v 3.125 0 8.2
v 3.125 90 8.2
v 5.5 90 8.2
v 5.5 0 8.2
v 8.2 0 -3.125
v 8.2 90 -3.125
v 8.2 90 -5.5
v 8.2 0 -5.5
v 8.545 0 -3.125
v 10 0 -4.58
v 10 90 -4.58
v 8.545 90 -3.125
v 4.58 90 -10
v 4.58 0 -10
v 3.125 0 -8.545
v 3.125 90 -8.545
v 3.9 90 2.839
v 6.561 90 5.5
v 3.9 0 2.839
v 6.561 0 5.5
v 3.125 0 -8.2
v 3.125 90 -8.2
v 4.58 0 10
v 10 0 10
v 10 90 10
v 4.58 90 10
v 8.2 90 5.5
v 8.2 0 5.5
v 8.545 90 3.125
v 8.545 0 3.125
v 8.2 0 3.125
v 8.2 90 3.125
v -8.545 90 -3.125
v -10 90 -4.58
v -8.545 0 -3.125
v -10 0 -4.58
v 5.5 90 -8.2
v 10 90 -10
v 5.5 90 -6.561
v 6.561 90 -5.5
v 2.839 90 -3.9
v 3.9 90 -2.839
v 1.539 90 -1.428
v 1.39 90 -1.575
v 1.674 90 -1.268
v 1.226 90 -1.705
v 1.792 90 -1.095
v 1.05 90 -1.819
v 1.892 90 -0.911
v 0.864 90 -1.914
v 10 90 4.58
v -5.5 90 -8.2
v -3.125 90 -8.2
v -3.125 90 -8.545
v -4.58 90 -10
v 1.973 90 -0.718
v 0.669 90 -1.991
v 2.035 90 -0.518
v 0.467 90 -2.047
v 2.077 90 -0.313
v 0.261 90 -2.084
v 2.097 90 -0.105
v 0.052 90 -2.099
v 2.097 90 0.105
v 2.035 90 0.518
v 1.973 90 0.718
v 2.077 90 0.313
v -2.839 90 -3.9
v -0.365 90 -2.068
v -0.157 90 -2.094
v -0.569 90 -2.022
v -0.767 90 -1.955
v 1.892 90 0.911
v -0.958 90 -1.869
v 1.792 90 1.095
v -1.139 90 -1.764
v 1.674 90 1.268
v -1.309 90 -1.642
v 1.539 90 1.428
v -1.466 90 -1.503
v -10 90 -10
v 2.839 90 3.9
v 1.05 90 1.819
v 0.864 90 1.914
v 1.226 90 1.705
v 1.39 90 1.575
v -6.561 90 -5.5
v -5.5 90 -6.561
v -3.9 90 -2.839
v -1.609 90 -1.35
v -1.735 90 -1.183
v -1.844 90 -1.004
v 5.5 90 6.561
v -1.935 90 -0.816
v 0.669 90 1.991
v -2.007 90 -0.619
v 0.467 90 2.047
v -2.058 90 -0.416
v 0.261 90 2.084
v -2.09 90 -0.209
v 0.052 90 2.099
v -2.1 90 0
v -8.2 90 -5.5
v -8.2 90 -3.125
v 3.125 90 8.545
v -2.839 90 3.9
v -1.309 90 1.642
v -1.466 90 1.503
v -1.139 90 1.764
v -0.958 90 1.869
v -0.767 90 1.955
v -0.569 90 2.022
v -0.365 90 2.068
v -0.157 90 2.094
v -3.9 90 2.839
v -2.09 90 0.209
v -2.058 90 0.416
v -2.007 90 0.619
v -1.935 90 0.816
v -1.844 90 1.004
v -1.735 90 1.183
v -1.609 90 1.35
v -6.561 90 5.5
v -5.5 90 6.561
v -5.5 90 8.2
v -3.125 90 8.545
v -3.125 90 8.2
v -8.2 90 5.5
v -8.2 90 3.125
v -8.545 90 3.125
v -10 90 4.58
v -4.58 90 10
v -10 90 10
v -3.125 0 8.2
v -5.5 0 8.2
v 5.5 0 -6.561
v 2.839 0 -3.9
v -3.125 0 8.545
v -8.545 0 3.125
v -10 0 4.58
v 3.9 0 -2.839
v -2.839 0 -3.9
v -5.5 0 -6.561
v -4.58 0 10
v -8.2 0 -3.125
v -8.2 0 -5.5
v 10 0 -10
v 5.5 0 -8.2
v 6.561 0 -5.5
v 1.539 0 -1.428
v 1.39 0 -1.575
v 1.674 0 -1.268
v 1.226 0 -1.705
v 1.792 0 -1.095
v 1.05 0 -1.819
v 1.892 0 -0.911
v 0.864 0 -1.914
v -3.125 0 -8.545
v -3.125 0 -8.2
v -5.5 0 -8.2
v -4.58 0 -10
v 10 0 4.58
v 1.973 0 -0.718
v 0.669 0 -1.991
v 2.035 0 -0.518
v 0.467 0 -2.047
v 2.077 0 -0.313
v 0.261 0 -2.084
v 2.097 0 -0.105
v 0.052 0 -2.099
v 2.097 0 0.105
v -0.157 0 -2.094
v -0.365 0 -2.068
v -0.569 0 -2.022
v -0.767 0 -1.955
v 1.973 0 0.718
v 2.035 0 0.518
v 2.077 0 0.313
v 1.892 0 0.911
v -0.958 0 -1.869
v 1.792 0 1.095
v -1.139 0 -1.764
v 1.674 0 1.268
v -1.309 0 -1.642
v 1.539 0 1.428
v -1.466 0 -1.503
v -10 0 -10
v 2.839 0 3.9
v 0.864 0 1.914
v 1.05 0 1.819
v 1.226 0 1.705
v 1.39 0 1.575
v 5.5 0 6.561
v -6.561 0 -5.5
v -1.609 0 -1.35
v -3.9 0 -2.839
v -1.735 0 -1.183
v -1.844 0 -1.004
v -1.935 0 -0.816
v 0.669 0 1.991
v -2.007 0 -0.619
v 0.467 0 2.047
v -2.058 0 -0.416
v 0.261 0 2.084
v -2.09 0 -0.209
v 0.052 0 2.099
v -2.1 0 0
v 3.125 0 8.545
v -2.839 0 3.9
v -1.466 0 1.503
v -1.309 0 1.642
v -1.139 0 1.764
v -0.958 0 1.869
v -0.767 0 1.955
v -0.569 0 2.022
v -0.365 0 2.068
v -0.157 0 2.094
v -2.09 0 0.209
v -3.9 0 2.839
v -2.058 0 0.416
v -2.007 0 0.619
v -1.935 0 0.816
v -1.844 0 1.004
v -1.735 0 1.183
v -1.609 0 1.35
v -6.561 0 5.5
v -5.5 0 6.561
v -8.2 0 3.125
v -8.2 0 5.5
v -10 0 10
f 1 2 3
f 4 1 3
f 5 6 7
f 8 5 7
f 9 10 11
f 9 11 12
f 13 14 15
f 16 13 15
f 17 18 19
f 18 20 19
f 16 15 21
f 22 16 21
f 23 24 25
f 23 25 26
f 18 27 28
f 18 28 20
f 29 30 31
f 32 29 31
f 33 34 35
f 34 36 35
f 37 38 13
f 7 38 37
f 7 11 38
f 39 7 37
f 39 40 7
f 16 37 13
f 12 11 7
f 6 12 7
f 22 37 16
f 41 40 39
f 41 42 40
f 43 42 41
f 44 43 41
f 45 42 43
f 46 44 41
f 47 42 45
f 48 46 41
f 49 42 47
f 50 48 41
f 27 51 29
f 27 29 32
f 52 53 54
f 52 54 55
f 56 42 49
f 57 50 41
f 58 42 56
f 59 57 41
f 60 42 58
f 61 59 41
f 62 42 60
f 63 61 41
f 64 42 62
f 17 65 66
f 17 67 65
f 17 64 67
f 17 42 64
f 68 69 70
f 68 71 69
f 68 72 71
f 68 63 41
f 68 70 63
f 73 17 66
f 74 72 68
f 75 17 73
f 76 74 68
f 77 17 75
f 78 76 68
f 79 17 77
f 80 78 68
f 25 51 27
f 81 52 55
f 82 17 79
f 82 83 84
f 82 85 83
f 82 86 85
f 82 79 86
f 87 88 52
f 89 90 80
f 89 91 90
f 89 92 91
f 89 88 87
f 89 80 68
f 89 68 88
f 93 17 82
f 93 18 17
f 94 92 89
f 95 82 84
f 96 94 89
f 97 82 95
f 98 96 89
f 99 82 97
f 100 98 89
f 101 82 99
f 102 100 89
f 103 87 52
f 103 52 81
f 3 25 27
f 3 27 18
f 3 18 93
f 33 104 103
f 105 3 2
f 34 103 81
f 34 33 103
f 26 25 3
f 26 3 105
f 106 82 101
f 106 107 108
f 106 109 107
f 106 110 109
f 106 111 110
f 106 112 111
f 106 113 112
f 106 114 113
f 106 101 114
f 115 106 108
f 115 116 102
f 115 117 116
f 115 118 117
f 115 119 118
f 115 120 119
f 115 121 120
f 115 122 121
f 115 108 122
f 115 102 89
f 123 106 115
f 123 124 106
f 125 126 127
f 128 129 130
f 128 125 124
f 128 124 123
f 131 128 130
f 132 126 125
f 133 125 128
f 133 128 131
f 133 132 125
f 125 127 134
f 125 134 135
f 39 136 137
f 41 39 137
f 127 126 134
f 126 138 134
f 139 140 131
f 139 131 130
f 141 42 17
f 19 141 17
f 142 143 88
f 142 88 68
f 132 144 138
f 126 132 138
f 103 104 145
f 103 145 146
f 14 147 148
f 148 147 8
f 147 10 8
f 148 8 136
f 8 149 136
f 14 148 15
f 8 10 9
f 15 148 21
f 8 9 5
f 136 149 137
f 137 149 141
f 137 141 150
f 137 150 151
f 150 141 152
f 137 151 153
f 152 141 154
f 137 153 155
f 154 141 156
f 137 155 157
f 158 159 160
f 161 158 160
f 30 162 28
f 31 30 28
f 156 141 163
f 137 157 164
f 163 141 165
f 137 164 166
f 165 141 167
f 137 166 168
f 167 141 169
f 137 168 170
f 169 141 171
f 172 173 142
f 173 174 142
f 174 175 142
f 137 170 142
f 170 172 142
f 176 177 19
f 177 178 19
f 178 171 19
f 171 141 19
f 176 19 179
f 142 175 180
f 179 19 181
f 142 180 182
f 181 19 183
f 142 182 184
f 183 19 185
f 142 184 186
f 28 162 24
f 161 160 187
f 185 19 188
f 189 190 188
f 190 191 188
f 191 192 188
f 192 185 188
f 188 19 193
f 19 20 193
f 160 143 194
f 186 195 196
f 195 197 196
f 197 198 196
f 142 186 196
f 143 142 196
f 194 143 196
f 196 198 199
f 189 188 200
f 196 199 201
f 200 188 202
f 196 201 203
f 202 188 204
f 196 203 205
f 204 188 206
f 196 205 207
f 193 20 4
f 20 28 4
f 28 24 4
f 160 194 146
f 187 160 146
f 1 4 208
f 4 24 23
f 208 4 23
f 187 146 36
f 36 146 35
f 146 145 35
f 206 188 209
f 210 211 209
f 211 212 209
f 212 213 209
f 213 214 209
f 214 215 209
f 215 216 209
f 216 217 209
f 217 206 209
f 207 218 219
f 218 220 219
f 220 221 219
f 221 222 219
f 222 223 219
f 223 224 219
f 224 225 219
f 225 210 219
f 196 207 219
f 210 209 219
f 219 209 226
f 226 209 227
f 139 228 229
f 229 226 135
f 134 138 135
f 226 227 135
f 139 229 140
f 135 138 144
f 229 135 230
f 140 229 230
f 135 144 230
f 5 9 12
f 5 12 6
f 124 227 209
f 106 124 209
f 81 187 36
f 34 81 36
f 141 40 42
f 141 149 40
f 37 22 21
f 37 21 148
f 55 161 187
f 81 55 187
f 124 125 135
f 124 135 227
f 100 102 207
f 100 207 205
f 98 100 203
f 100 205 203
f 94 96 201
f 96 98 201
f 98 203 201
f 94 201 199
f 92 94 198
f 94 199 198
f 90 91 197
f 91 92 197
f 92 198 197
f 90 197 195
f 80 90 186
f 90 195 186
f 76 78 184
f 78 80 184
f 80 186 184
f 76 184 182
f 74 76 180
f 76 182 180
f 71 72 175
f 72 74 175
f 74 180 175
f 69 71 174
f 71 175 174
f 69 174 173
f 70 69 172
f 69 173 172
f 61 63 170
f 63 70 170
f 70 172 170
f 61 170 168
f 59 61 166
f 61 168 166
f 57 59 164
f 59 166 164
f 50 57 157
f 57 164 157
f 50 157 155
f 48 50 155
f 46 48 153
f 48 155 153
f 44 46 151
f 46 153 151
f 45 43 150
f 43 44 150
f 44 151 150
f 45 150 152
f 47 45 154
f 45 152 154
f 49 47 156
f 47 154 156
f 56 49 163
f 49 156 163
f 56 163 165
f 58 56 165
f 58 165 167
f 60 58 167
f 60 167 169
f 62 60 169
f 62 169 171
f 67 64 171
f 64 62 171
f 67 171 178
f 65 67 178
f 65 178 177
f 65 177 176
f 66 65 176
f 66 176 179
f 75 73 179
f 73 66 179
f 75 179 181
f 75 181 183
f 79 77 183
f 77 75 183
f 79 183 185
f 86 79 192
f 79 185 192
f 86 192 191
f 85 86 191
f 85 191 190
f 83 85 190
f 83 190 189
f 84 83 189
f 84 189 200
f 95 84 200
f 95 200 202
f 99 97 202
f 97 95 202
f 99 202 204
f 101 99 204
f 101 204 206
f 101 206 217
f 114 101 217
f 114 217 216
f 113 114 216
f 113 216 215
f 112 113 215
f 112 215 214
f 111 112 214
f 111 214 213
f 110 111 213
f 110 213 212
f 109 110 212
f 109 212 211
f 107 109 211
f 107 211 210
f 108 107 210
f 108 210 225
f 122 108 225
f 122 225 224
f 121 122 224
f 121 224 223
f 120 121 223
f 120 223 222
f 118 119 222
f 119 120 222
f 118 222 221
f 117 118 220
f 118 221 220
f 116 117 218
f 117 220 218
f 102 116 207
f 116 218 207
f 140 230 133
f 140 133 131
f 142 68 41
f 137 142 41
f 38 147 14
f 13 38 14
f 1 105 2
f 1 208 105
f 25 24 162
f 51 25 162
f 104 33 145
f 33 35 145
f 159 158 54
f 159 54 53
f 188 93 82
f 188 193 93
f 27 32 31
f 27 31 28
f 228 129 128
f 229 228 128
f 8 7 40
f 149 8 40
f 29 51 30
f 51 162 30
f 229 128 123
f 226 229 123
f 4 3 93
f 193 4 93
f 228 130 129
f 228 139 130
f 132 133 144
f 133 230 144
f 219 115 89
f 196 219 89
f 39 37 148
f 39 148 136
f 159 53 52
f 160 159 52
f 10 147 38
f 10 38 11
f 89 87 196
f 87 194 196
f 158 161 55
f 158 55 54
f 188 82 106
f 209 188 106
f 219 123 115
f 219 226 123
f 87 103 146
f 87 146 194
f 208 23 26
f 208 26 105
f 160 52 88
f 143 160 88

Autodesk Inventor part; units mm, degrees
sketch "Sketch1" plane through (0, 0, 0) normal (0, 1, 0) x (-1, 0, 0)
  circle A0 centre (0, 0) radius 2.1
  line L0 (10, 10) -> (-10, 10) construction
  line L1 (-10, 10) -> (-10, -10) construction
  line L2 (-10, -10) -> (10, -10)
  line L3 (10, -10) -> (10, 10) construction
  line L4 (10, 10) -> (-10, -10) construction
  line L5 (-10, 10) -> (10, -10) construction
  line L6 (8.2, 10) -> (8.2, -10) construction
  line L7 (3.9, 10) -> (3.9, -10) construction
  line L8 (8.2, 3.125) -> (8.2, -3.125) construction
  line L9 (10, 4.58) -> (10, -4.58) construction
  line L10 (8.2, 5.5) -> (8.2, -5.5) construction
  line L11 (3.3697, 4.4303) -> (4.4303, 3.3697) construction
  line L12 (10, 10) -> (10, 4.58)
  line L13 (10, 4.58) -> (8.545, 3.125)
  line L14 (8.545, 3.125) -> (8.2, 3.125)
  line L15 (8.2, 3.125) -> (8.2, 5.5)
  line L16 (14, 0) -> (-14, 0) construction
  line L17 (8.2, 5.5) -> (6.5607, 5.5)
  line L18 (6.5607, 5.5) -> (3.9, 2.8393)
  line L19 (3.9, 2.8393) -> (3.9, 0)
  line L20 (10, -10) -> (10, -4.58)
  line L21 (10, -4.58) -> (8.545, -3.125)
  line L22 (8.545, -3.125) -> (8.2, -3.125)
  line L23 (8.2, -3.125) -> (8.2, -5.5)
  line L24 (8.2, -5.5) -> (6.5607, -5.5)
  line L25 (6.5607, -5.5) -> (3.9, -2.8393)
  line L26 (3.9, -2.8393) -> (3.9, 0)
  line L27 (-10, 10) -> (-4.58, 10)
  line L28 (-4.58, 10) -> (-3.125, 8.545)
  line L29 (-3.125, 8.2) -> (-5.5, 8.2)
  line L30 (-5.5, 8.2) -> (-5.5, 6.5607)
  line L31 (-5.5, 6.5607) -> (-2.8393, 3.9)
  line L32 (-2.8393, 3.9) -> (0, 3.9)
  line L33 (2.8393, 3.9) -> (0, 3.9)
  line L34 (5.5, 6.5607) -> (2.8393, 3.9)
  line L35 (5.5, 8.2) -> (5.5, 6.5607)
  line L36 (3.125, 8.2) -> (5.5, 8.2)
  line L37 (3.125, 8.545) -> (3.125, 8.2)
  line L38 (4.58, 10) -> (3.125, 8.545)
  line L39 (-3.125, 8.545) -> (-3.125, 8.2)
  line L40 (10, 10) -> (4.58, 10)
  line L41 (-10, -10) -> (-10, -4.58)
  line L42 (-10, -4.58) -> (-8.545, -3.125)
  line L43 (-8.2, -3.125) -> (-8.2, -5.5)
  line L44 (-8.2, -5.5) -> (-6.5607, -5.5)
  line L45 (-6.5607, -5.5) -> (-3.9, -2.8393)
  line L46 (-3.9, -2.8393) -> (-3.9, 0)
  line L47 (-3.9, 2.8393) -> (-3.9, 0)
  line L48 (-6.5607, 5.5) -> (-3.9, 2.8393)
  line L49 (-8.2, 5.5) -> (-6.5607, 5.5)
  line L50 (-8.2, 3.125) -> (-8.2, 5.5)
  line L51 (-8.545, 3.125) -> (-8.2, 3.125)
  line L52 (-10, 4.58) -> (-8.545, 3.125)
  line L53 (-8.545, -3.125) -> (-8.2, -3.125)
  line L54 (-10, 10) -> (-10, 4.58)
  line L55 (10, -10) -> (4.58, -10) construction
  line L56 (4.58, -10) -> (3.125, -8.545)
  line L57 (3.125, -8.2) -> (5.5, -8.2)
  line L58 (5.5, -8.2) -> (5.5, -6.5607)
  line L59 (5.5, -6.5607) -> (2.8393, -3.9)
  line L60 (2.8393, -3.9) -> (0, -3.9)
  line L61 (-2.8393, -3.9) -> (0, -3.9)
  line L62 (-5.5, -6.5607) -> (-2.8393, -3.9)
  line L63 (-5.5, -8.2) -> (-5.5, -6.5607)
  line L64 (-3.125, -8.2) -> (-5.5, -8.2)
  line L65 (-3.125, -8.545) -> (-3.125, -8.2)
  line L66 (-4.58, -10) -> (-3.125, -8.545)
  line L67 (3.125, -8.545) -> (3.125, -8.2)
  line L68 (-10, -10) -> (-4.58, -10) construction
  line L69 (5.5, -6.5607) -> (6.2393, -7.3)
  line L70 (6.2393, -7.3) -> (8.2, -7.3)
  line L71 (0, -10) -> (0, -9) construction
  line L72 (-5.5, -6.5607) -> (-6.2393, -7.3)
  line L73 (-6.2393, -7.3) -> (-8.2, -7.3)
  line L74 (8.2, -7.3) -> (8.2, -10)
  line L75 (-8.2, -7.3) -> (-8.2, -10)
  point P0 (10, 0)
  point P1 (8.2, 0)
  point P2 (3.9, 3.9)
  point P3 (-3.3697, 4.4303)
  point P4 (-4.4303, -3.3697)
  point P5 (3.3697, -4.4303)
  dimension "d0" = 4.2
  dimension "d1" = 20
  dimension "d2" = 20
  dimension "d3" = 1.8
  dimension "d4" = 4.3
  dimension "d5" = 6.25
  dimension "d6" = 9.16
  dimension "d7" = 11
  dimension "d8" = 1.5
  dimension "d9" = 45
  dimension "d12" = 360
  dimension "d17" = 1.8
  dimension "d18" = 1
extrude "Extrusion1" add sketch "Sketch1" along normal blind 90 contours L41 L42 L53 L43 L44 L45 L46 L47 L48 L49 L50 L51 L52 L54 L27 L28 L39 L29 L30 L31 L32 L33 L34 L35 L36 L37 L38 L40 L12 L13 L14 L15 L17 L18 L19 L26 L25 L24 L23 L22 L21 L20 L2 L74 L70 L69 L59 L60 L61 L62 L72 L73 L75 | L75 L73 L72 L63 L64 L65 L66 L2 | L56 L67 L57 L58 L69 L70 L74 L2
ref_plane "Work Plane1" through (-2.8393, 0, 0) normal (0, 0, -1) x (-1, 0, 0)
ref_plane "Work Plane2" through (0, 0, 4.58) normal (1, 0, 0) x (0, 0, -1)
ref_plane "Work Plane3" through (0, 45, 0) normal (0, 1, 0) x (1, 0, 0)
ref_plane "Work Plane4" through (-4.58, 0, 0) normal (0, 0, 1) x (1, 0, 0)
ref_plane "Work Plane5" through (0, 45, 0) normal (0, -1, 0) x (1, 0, 0)
ref_plane "Work Plane6" through (10, 0, 0) normal (0, 0, 1) x (1, 0, 0)
ref_plane "Work Plane7" through (0, 0, 4.58) normal (1, 0, 0) x (0, 0, -1)
properties part number "VSLOT 2020 Extrusion Mini" material "Aluminum 6061"
